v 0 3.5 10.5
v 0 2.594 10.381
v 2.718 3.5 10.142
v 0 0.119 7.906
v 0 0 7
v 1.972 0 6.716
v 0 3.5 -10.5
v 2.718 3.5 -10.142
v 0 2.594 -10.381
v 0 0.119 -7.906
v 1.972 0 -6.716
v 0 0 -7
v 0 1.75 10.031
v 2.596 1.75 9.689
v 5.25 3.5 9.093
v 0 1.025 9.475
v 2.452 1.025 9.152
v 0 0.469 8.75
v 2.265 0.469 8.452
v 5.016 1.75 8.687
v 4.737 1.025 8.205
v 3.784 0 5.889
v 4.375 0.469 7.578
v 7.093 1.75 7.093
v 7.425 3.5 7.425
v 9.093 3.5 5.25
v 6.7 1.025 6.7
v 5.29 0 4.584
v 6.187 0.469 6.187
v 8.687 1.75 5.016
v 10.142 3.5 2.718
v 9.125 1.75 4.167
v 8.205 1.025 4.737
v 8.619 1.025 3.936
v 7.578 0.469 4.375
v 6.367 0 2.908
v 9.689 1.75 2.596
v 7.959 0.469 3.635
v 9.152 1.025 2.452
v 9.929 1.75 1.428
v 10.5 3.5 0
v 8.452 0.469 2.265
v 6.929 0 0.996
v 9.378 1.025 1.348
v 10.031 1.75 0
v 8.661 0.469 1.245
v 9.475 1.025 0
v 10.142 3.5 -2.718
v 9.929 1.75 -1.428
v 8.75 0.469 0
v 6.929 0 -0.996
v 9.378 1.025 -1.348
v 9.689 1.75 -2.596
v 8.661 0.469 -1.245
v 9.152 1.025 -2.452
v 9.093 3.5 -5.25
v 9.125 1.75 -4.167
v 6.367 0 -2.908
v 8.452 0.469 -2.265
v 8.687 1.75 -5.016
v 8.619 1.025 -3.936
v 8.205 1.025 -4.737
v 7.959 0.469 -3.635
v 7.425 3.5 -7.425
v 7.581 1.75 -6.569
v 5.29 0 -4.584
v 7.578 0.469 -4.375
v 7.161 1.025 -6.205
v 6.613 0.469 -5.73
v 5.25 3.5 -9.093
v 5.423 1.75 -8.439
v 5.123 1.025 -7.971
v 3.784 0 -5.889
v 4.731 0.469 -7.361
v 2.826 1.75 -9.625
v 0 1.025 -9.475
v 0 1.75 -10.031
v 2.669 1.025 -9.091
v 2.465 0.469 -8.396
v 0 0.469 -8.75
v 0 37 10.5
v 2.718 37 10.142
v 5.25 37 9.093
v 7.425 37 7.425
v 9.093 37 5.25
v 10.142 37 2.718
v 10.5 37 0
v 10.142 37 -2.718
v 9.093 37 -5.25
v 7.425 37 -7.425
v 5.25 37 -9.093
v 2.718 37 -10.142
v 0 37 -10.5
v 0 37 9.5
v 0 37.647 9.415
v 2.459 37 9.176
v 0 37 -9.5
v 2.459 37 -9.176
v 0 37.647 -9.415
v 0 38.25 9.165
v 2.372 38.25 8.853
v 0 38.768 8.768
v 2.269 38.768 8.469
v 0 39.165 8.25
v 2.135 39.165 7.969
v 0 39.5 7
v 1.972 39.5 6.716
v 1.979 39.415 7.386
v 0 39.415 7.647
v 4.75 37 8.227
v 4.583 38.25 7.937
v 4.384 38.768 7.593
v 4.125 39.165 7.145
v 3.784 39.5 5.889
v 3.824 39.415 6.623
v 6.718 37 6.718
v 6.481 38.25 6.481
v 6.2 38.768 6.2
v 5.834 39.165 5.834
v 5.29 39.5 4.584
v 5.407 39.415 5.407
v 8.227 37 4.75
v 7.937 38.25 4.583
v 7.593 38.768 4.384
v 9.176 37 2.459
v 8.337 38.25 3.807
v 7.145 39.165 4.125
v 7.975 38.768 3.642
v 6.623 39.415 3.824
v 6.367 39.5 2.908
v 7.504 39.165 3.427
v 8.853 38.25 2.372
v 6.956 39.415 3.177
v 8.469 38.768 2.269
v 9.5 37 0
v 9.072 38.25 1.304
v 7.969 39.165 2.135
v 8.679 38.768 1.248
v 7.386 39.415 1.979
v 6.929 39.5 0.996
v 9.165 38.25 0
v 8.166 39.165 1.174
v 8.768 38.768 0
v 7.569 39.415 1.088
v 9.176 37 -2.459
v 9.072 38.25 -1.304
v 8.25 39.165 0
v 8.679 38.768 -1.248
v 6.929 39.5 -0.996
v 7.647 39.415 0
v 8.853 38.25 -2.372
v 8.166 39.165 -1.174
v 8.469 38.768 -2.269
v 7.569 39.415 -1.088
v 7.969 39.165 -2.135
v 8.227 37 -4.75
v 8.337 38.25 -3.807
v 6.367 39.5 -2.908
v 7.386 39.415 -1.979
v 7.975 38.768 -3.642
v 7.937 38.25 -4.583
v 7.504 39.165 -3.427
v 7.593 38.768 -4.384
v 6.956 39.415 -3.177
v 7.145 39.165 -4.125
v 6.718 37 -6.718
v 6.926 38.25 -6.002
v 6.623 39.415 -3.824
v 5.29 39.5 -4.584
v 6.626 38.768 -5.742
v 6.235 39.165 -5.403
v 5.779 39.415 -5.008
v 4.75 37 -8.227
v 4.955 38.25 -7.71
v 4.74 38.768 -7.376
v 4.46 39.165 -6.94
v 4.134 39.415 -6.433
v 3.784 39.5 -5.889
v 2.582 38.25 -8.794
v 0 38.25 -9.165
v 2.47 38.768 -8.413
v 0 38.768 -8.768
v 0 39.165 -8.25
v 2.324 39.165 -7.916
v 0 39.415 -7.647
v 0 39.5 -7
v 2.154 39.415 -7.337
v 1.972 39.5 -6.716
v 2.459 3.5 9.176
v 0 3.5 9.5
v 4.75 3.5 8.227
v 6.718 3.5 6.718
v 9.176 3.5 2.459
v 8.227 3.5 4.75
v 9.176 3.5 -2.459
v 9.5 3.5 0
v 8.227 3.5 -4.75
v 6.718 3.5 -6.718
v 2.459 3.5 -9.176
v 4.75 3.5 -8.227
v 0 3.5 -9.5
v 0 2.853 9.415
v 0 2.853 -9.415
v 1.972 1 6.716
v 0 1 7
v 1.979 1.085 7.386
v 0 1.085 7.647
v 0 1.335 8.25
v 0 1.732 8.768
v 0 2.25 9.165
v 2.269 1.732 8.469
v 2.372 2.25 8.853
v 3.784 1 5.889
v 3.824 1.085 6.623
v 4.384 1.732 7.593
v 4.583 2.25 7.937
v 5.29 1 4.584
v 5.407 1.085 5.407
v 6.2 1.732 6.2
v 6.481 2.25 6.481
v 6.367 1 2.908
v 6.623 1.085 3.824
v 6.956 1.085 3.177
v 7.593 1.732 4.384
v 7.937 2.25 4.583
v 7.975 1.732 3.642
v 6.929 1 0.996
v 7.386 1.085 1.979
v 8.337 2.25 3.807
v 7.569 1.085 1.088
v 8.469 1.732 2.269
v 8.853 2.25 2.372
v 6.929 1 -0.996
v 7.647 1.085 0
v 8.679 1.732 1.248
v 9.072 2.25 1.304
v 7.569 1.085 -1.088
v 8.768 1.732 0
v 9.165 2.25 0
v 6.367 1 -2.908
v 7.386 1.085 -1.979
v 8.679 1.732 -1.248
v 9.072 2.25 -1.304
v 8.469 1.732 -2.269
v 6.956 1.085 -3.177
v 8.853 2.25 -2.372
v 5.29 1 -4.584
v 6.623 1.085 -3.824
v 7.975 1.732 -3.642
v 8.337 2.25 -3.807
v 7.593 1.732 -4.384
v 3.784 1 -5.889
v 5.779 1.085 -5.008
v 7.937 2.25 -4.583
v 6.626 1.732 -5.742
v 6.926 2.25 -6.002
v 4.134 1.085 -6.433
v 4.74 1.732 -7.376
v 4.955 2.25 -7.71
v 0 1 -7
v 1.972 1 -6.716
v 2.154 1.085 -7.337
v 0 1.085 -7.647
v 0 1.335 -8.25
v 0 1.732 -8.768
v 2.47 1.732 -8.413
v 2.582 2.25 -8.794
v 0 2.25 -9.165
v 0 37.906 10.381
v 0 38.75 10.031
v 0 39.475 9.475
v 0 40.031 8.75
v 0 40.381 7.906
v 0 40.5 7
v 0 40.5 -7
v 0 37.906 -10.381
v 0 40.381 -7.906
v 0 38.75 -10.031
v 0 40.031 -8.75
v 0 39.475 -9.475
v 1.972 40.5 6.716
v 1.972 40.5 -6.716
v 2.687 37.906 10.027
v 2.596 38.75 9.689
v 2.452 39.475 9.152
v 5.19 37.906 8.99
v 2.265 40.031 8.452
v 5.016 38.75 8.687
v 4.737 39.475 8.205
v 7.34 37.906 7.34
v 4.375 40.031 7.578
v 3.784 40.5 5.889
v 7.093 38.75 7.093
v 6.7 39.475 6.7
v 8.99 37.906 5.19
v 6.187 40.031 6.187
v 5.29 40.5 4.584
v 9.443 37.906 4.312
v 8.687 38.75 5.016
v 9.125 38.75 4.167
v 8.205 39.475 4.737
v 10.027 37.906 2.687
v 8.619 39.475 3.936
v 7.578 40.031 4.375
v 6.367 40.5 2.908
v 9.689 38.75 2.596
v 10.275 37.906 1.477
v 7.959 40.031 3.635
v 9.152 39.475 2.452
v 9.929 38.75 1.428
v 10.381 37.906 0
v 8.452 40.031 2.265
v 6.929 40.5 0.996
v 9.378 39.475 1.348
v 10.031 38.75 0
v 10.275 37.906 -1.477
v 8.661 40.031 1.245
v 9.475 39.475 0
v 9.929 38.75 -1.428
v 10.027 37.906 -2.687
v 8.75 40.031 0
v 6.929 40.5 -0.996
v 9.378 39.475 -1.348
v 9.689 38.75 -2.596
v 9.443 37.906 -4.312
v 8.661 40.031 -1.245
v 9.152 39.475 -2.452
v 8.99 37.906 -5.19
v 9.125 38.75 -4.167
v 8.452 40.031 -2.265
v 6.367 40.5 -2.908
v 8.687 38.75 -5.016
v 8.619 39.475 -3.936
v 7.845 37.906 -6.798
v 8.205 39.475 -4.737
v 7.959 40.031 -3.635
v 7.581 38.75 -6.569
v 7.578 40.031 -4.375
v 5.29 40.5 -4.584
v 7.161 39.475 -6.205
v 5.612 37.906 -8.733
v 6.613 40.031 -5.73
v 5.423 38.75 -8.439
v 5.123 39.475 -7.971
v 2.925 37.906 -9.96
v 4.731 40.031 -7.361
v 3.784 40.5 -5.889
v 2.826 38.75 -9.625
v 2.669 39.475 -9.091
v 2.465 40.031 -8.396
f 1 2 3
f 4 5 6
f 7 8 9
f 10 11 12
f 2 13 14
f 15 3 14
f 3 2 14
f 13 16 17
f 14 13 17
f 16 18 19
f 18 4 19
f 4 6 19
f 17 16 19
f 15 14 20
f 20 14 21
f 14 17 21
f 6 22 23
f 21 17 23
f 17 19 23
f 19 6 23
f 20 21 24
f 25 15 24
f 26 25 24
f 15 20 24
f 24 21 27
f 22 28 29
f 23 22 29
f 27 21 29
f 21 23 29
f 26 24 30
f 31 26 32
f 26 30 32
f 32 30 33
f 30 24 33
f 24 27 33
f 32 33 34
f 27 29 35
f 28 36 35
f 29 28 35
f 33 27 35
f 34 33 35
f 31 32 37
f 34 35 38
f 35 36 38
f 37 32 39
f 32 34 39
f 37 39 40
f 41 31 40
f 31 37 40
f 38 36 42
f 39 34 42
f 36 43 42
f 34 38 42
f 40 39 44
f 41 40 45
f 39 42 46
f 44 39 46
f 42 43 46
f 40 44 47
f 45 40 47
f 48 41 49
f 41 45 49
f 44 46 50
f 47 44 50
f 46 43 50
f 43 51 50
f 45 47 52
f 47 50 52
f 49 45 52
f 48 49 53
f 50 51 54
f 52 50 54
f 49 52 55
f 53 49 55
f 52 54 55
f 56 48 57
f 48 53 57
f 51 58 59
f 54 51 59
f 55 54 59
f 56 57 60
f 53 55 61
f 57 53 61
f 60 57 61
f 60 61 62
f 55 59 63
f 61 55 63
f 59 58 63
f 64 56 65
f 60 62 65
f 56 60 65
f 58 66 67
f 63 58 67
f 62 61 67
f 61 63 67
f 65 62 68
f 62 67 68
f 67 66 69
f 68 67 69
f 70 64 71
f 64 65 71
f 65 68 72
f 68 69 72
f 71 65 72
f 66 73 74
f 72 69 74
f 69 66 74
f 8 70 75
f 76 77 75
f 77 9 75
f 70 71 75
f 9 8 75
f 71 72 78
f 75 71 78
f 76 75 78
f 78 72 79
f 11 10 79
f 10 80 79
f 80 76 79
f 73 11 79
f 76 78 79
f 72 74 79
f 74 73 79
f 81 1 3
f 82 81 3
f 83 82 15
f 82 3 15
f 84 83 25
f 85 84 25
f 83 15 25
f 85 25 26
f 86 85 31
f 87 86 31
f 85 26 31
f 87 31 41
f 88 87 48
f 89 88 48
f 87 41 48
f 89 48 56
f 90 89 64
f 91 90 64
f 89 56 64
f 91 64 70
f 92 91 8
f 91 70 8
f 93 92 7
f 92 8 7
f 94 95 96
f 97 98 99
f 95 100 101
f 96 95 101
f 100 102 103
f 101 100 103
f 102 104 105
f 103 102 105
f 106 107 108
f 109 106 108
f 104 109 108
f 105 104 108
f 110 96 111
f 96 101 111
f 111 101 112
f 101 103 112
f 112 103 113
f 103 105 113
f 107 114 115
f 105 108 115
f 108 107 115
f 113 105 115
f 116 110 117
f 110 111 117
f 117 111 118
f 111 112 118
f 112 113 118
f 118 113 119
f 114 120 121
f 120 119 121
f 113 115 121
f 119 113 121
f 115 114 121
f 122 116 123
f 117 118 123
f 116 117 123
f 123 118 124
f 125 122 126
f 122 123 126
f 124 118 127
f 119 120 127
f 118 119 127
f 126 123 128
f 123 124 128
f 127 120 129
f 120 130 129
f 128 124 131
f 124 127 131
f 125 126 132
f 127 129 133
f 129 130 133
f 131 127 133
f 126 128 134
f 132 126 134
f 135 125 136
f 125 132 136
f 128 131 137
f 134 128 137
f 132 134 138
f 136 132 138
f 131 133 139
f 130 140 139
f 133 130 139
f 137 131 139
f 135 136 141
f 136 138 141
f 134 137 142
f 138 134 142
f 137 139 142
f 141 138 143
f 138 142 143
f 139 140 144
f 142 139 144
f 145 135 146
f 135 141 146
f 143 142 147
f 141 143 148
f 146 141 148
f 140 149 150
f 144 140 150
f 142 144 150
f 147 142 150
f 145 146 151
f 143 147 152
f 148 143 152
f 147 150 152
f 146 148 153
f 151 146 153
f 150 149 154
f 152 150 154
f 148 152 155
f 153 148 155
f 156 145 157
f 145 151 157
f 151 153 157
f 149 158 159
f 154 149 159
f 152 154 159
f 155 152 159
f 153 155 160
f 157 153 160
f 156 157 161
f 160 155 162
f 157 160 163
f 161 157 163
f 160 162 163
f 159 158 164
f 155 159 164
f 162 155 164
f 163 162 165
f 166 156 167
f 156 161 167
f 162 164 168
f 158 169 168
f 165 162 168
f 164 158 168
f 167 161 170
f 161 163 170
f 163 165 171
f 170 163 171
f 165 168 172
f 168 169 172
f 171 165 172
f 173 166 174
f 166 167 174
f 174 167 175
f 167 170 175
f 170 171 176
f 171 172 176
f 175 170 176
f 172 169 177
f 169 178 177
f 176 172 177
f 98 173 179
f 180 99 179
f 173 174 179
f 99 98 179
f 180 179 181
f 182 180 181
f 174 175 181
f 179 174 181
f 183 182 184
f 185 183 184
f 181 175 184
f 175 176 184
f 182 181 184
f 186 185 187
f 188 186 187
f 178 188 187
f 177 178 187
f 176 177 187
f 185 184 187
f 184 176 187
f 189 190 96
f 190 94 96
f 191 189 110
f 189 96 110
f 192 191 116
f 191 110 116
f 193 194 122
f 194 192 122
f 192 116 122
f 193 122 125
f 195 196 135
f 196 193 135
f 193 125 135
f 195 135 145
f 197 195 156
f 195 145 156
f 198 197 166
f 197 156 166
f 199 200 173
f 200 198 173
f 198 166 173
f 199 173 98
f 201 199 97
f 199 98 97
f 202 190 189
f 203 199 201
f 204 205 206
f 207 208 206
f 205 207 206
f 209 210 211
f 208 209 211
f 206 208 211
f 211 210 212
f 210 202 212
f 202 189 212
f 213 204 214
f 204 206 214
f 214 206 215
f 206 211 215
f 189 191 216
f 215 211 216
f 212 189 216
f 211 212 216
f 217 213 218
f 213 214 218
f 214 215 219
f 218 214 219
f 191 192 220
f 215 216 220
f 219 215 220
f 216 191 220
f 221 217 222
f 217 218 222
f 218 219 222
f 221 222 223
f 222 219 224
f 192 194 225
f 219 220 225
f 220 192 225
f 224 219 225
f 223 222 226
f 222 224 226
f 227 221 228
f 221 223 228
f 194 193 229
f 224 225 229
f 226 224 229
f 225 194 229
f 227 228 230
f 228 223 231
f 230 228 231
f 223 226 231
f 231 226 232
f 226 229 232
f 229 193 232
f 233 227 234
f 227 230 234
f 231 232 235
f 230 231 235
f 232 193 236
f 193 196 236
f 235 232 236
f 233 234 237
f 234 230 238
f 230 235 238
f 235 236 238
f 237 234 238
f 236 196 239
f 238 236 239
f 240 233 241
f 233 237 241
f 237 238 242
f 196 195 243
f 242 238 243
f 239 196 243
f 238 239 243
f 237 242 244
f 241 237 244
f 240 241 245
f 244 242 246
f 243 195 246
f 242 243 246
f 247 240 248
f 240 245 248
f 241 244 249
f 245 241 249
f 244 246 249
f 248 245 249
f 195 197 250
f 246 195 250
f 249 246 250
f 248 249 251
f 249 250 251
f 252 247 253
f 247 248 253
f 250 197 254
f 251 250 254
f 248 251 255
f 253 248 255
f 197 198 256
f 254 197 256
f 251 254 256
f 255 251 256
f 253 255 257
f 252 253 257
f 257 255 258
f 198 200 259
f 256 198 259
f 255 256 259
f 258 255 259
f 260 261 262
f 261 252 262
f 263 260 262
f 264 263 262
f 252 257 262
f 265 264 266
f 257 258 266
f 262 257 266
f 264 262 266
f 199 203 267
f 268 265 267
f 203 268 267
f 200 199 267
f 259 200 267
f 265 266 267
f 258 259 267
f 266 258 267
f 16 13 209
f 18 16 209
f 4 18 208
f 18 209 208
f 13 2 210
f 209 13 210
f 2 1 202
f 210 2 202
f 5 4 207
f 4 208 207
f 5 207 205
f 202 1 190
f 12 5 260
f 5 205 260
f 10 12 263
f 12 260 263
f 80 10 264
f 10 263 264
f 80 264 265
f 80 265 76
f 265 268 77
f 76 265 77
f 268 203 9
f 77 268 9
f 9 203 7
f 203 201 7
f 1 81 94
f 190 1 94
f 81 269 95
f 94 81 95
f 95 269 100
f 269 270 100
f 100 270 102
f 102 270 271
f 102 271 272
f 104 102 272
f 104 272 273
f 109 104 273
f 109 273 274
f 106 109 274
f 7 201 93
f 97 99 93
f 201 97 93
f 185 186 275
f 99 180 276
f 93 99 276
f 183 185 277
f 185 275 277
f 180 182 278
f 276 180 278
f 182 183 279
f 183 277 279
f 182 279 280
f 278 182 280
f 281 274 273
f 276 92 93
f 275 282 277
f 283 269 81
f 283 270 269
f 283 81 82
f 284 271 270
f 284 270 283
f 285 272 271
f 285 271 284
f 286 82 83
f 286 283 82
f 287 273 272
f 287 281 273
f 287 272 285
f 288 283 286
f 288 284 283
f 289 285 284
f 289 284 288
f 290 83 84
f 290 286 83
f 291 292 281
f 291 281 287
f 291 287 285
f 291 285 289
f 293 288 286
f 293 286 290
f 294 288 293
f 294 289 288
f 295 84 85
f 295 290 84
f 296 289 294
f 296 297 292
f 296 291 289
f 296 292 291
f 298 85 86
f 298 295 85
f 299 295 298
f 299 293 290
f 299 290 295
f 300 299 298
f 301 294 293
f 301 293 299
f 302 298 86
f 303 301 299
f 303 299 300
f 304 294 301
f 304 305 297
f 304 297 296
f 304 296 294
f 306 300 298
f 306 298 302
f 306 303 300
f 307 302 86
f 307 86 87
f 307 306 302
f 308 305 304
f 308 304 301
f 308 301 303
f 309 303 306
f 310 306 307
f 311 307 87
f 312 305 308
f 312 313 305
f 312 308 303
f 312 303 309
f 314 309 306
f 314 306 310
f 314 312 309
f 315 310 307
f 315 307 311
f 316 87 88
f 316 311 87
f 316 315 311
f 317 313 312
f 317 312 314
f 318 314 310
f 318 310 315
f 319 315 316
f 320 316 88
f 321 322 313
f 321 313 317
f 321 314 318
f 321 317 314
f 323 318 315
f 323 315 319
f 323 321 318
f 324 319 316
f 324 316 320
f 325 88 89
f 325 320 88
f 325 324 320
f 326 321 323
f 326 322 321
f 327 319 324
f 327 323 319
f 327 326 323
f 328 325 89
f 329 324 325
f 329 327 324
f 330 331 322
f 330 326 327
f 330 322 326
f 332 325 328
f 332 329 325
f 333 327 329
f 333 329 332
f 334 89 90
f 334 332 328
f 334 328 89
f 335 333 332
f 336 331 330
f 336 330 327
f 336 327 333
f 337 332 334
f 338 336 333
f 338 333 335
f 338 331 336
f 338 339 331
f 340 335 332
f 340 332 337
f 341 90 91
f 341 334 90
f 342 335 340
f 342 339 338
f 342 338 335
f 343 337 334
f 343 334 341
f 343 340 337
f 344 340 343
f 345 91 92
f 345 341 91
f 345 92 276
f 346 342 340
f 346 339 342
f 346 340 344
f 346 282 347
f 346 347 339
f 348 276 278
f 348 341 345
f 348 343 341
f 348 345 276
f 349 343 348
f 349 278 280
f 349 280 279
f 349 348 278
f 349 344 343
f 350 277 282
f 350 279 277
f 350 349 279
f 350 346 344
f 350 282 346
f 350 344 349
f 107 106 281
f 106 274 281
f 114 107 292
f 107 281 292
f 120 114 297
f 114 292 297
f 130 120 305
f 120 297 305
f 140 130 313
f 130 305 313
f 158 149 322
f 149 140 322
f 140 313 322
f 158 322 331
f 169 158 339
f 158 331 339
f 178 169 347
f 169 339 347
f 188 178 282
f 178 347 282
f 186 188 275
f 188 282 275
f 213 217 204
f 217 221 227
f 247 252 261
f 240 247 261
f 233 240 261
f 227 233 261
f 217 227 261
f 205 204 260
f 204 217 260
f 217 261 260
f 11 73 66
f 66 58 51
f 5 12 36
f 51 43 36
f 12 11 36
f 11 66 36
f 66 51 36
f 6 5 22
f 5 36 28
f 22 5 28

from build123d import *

# Parameters (mm, degrees)
SKETCH1_R           = 10.5
BOSS_EXTRUDE1_DEPTH = 40.5
FILLET1_R           = 3.5
SKETCH2_W           = 41.275373403
SKETCH2_H           = 50.56233242
CUT_EXTRUDE1_DEPTH  = 40.5


# Read off the part's stored shape, not the designer's step: Shell4
with BuildPart() as part:
    # Sketch1 → Boss-Extrude1 (new body)
    with BuildSketch(Plane(origin=(0, 0, 0), x_dir=(1, 0, 0), z_dir=(0, 1, 0))):
        with Locations(Location((0, 0, 0), (0, 0, 270))):
            Circle(SKETCH1_R)
    extrude(amount=BOSS_EXTRUDE1_DEPTH)

    # Fillet1
    fillet1_edges = [part.edges().sort_by_distance(p)[0] for p in [
        (0, 0, -10.5),
        (0, 40.5, -10.5),
    ]]
    fillet(fillet1_edges, radius=FILLET1_R)

    # Sketch2 → Cut-Extrude1 (cut)
    with BuildSketch(Plane(origin=(0, 0, 0), x_dir=(0, 0, -1), z_dir=(1, 0, 0))):
        with Locations((2.800828909, 23.566771077)):
            Rectangle(SKETCH2_W, SKETCH2_H)
    extrude(amount=-CUT_EXTRUDE1_DEPTH, mode=Mode.SUBTRACT)

    # Shell4 outline → Shell4 (revolve, cut)
    with BuildSketch(Plane.XY):
        with BuildLine():
            Line((0, 1), (7, 1))
            ThreePointArc((7, 1), (8.767766953, 1.732233047), (9.5, 3.5))
            Line((9.5, 3.5), (9.5, 37))
            ThreePointArc((9.5, 37), (8.767766953, 38.767766953), (7, 39.5))
            Line((7, 39.5), (7, 40.5))
            Line((7, 40.5), (0, 40.5))
            Line((0, 40.5), (0, 1))
        make_face()
    revolve(axis=Axis((0, 0, 0), (0, 1, 0)), mode=Mode.SUBTRACT)


solid = part.part
